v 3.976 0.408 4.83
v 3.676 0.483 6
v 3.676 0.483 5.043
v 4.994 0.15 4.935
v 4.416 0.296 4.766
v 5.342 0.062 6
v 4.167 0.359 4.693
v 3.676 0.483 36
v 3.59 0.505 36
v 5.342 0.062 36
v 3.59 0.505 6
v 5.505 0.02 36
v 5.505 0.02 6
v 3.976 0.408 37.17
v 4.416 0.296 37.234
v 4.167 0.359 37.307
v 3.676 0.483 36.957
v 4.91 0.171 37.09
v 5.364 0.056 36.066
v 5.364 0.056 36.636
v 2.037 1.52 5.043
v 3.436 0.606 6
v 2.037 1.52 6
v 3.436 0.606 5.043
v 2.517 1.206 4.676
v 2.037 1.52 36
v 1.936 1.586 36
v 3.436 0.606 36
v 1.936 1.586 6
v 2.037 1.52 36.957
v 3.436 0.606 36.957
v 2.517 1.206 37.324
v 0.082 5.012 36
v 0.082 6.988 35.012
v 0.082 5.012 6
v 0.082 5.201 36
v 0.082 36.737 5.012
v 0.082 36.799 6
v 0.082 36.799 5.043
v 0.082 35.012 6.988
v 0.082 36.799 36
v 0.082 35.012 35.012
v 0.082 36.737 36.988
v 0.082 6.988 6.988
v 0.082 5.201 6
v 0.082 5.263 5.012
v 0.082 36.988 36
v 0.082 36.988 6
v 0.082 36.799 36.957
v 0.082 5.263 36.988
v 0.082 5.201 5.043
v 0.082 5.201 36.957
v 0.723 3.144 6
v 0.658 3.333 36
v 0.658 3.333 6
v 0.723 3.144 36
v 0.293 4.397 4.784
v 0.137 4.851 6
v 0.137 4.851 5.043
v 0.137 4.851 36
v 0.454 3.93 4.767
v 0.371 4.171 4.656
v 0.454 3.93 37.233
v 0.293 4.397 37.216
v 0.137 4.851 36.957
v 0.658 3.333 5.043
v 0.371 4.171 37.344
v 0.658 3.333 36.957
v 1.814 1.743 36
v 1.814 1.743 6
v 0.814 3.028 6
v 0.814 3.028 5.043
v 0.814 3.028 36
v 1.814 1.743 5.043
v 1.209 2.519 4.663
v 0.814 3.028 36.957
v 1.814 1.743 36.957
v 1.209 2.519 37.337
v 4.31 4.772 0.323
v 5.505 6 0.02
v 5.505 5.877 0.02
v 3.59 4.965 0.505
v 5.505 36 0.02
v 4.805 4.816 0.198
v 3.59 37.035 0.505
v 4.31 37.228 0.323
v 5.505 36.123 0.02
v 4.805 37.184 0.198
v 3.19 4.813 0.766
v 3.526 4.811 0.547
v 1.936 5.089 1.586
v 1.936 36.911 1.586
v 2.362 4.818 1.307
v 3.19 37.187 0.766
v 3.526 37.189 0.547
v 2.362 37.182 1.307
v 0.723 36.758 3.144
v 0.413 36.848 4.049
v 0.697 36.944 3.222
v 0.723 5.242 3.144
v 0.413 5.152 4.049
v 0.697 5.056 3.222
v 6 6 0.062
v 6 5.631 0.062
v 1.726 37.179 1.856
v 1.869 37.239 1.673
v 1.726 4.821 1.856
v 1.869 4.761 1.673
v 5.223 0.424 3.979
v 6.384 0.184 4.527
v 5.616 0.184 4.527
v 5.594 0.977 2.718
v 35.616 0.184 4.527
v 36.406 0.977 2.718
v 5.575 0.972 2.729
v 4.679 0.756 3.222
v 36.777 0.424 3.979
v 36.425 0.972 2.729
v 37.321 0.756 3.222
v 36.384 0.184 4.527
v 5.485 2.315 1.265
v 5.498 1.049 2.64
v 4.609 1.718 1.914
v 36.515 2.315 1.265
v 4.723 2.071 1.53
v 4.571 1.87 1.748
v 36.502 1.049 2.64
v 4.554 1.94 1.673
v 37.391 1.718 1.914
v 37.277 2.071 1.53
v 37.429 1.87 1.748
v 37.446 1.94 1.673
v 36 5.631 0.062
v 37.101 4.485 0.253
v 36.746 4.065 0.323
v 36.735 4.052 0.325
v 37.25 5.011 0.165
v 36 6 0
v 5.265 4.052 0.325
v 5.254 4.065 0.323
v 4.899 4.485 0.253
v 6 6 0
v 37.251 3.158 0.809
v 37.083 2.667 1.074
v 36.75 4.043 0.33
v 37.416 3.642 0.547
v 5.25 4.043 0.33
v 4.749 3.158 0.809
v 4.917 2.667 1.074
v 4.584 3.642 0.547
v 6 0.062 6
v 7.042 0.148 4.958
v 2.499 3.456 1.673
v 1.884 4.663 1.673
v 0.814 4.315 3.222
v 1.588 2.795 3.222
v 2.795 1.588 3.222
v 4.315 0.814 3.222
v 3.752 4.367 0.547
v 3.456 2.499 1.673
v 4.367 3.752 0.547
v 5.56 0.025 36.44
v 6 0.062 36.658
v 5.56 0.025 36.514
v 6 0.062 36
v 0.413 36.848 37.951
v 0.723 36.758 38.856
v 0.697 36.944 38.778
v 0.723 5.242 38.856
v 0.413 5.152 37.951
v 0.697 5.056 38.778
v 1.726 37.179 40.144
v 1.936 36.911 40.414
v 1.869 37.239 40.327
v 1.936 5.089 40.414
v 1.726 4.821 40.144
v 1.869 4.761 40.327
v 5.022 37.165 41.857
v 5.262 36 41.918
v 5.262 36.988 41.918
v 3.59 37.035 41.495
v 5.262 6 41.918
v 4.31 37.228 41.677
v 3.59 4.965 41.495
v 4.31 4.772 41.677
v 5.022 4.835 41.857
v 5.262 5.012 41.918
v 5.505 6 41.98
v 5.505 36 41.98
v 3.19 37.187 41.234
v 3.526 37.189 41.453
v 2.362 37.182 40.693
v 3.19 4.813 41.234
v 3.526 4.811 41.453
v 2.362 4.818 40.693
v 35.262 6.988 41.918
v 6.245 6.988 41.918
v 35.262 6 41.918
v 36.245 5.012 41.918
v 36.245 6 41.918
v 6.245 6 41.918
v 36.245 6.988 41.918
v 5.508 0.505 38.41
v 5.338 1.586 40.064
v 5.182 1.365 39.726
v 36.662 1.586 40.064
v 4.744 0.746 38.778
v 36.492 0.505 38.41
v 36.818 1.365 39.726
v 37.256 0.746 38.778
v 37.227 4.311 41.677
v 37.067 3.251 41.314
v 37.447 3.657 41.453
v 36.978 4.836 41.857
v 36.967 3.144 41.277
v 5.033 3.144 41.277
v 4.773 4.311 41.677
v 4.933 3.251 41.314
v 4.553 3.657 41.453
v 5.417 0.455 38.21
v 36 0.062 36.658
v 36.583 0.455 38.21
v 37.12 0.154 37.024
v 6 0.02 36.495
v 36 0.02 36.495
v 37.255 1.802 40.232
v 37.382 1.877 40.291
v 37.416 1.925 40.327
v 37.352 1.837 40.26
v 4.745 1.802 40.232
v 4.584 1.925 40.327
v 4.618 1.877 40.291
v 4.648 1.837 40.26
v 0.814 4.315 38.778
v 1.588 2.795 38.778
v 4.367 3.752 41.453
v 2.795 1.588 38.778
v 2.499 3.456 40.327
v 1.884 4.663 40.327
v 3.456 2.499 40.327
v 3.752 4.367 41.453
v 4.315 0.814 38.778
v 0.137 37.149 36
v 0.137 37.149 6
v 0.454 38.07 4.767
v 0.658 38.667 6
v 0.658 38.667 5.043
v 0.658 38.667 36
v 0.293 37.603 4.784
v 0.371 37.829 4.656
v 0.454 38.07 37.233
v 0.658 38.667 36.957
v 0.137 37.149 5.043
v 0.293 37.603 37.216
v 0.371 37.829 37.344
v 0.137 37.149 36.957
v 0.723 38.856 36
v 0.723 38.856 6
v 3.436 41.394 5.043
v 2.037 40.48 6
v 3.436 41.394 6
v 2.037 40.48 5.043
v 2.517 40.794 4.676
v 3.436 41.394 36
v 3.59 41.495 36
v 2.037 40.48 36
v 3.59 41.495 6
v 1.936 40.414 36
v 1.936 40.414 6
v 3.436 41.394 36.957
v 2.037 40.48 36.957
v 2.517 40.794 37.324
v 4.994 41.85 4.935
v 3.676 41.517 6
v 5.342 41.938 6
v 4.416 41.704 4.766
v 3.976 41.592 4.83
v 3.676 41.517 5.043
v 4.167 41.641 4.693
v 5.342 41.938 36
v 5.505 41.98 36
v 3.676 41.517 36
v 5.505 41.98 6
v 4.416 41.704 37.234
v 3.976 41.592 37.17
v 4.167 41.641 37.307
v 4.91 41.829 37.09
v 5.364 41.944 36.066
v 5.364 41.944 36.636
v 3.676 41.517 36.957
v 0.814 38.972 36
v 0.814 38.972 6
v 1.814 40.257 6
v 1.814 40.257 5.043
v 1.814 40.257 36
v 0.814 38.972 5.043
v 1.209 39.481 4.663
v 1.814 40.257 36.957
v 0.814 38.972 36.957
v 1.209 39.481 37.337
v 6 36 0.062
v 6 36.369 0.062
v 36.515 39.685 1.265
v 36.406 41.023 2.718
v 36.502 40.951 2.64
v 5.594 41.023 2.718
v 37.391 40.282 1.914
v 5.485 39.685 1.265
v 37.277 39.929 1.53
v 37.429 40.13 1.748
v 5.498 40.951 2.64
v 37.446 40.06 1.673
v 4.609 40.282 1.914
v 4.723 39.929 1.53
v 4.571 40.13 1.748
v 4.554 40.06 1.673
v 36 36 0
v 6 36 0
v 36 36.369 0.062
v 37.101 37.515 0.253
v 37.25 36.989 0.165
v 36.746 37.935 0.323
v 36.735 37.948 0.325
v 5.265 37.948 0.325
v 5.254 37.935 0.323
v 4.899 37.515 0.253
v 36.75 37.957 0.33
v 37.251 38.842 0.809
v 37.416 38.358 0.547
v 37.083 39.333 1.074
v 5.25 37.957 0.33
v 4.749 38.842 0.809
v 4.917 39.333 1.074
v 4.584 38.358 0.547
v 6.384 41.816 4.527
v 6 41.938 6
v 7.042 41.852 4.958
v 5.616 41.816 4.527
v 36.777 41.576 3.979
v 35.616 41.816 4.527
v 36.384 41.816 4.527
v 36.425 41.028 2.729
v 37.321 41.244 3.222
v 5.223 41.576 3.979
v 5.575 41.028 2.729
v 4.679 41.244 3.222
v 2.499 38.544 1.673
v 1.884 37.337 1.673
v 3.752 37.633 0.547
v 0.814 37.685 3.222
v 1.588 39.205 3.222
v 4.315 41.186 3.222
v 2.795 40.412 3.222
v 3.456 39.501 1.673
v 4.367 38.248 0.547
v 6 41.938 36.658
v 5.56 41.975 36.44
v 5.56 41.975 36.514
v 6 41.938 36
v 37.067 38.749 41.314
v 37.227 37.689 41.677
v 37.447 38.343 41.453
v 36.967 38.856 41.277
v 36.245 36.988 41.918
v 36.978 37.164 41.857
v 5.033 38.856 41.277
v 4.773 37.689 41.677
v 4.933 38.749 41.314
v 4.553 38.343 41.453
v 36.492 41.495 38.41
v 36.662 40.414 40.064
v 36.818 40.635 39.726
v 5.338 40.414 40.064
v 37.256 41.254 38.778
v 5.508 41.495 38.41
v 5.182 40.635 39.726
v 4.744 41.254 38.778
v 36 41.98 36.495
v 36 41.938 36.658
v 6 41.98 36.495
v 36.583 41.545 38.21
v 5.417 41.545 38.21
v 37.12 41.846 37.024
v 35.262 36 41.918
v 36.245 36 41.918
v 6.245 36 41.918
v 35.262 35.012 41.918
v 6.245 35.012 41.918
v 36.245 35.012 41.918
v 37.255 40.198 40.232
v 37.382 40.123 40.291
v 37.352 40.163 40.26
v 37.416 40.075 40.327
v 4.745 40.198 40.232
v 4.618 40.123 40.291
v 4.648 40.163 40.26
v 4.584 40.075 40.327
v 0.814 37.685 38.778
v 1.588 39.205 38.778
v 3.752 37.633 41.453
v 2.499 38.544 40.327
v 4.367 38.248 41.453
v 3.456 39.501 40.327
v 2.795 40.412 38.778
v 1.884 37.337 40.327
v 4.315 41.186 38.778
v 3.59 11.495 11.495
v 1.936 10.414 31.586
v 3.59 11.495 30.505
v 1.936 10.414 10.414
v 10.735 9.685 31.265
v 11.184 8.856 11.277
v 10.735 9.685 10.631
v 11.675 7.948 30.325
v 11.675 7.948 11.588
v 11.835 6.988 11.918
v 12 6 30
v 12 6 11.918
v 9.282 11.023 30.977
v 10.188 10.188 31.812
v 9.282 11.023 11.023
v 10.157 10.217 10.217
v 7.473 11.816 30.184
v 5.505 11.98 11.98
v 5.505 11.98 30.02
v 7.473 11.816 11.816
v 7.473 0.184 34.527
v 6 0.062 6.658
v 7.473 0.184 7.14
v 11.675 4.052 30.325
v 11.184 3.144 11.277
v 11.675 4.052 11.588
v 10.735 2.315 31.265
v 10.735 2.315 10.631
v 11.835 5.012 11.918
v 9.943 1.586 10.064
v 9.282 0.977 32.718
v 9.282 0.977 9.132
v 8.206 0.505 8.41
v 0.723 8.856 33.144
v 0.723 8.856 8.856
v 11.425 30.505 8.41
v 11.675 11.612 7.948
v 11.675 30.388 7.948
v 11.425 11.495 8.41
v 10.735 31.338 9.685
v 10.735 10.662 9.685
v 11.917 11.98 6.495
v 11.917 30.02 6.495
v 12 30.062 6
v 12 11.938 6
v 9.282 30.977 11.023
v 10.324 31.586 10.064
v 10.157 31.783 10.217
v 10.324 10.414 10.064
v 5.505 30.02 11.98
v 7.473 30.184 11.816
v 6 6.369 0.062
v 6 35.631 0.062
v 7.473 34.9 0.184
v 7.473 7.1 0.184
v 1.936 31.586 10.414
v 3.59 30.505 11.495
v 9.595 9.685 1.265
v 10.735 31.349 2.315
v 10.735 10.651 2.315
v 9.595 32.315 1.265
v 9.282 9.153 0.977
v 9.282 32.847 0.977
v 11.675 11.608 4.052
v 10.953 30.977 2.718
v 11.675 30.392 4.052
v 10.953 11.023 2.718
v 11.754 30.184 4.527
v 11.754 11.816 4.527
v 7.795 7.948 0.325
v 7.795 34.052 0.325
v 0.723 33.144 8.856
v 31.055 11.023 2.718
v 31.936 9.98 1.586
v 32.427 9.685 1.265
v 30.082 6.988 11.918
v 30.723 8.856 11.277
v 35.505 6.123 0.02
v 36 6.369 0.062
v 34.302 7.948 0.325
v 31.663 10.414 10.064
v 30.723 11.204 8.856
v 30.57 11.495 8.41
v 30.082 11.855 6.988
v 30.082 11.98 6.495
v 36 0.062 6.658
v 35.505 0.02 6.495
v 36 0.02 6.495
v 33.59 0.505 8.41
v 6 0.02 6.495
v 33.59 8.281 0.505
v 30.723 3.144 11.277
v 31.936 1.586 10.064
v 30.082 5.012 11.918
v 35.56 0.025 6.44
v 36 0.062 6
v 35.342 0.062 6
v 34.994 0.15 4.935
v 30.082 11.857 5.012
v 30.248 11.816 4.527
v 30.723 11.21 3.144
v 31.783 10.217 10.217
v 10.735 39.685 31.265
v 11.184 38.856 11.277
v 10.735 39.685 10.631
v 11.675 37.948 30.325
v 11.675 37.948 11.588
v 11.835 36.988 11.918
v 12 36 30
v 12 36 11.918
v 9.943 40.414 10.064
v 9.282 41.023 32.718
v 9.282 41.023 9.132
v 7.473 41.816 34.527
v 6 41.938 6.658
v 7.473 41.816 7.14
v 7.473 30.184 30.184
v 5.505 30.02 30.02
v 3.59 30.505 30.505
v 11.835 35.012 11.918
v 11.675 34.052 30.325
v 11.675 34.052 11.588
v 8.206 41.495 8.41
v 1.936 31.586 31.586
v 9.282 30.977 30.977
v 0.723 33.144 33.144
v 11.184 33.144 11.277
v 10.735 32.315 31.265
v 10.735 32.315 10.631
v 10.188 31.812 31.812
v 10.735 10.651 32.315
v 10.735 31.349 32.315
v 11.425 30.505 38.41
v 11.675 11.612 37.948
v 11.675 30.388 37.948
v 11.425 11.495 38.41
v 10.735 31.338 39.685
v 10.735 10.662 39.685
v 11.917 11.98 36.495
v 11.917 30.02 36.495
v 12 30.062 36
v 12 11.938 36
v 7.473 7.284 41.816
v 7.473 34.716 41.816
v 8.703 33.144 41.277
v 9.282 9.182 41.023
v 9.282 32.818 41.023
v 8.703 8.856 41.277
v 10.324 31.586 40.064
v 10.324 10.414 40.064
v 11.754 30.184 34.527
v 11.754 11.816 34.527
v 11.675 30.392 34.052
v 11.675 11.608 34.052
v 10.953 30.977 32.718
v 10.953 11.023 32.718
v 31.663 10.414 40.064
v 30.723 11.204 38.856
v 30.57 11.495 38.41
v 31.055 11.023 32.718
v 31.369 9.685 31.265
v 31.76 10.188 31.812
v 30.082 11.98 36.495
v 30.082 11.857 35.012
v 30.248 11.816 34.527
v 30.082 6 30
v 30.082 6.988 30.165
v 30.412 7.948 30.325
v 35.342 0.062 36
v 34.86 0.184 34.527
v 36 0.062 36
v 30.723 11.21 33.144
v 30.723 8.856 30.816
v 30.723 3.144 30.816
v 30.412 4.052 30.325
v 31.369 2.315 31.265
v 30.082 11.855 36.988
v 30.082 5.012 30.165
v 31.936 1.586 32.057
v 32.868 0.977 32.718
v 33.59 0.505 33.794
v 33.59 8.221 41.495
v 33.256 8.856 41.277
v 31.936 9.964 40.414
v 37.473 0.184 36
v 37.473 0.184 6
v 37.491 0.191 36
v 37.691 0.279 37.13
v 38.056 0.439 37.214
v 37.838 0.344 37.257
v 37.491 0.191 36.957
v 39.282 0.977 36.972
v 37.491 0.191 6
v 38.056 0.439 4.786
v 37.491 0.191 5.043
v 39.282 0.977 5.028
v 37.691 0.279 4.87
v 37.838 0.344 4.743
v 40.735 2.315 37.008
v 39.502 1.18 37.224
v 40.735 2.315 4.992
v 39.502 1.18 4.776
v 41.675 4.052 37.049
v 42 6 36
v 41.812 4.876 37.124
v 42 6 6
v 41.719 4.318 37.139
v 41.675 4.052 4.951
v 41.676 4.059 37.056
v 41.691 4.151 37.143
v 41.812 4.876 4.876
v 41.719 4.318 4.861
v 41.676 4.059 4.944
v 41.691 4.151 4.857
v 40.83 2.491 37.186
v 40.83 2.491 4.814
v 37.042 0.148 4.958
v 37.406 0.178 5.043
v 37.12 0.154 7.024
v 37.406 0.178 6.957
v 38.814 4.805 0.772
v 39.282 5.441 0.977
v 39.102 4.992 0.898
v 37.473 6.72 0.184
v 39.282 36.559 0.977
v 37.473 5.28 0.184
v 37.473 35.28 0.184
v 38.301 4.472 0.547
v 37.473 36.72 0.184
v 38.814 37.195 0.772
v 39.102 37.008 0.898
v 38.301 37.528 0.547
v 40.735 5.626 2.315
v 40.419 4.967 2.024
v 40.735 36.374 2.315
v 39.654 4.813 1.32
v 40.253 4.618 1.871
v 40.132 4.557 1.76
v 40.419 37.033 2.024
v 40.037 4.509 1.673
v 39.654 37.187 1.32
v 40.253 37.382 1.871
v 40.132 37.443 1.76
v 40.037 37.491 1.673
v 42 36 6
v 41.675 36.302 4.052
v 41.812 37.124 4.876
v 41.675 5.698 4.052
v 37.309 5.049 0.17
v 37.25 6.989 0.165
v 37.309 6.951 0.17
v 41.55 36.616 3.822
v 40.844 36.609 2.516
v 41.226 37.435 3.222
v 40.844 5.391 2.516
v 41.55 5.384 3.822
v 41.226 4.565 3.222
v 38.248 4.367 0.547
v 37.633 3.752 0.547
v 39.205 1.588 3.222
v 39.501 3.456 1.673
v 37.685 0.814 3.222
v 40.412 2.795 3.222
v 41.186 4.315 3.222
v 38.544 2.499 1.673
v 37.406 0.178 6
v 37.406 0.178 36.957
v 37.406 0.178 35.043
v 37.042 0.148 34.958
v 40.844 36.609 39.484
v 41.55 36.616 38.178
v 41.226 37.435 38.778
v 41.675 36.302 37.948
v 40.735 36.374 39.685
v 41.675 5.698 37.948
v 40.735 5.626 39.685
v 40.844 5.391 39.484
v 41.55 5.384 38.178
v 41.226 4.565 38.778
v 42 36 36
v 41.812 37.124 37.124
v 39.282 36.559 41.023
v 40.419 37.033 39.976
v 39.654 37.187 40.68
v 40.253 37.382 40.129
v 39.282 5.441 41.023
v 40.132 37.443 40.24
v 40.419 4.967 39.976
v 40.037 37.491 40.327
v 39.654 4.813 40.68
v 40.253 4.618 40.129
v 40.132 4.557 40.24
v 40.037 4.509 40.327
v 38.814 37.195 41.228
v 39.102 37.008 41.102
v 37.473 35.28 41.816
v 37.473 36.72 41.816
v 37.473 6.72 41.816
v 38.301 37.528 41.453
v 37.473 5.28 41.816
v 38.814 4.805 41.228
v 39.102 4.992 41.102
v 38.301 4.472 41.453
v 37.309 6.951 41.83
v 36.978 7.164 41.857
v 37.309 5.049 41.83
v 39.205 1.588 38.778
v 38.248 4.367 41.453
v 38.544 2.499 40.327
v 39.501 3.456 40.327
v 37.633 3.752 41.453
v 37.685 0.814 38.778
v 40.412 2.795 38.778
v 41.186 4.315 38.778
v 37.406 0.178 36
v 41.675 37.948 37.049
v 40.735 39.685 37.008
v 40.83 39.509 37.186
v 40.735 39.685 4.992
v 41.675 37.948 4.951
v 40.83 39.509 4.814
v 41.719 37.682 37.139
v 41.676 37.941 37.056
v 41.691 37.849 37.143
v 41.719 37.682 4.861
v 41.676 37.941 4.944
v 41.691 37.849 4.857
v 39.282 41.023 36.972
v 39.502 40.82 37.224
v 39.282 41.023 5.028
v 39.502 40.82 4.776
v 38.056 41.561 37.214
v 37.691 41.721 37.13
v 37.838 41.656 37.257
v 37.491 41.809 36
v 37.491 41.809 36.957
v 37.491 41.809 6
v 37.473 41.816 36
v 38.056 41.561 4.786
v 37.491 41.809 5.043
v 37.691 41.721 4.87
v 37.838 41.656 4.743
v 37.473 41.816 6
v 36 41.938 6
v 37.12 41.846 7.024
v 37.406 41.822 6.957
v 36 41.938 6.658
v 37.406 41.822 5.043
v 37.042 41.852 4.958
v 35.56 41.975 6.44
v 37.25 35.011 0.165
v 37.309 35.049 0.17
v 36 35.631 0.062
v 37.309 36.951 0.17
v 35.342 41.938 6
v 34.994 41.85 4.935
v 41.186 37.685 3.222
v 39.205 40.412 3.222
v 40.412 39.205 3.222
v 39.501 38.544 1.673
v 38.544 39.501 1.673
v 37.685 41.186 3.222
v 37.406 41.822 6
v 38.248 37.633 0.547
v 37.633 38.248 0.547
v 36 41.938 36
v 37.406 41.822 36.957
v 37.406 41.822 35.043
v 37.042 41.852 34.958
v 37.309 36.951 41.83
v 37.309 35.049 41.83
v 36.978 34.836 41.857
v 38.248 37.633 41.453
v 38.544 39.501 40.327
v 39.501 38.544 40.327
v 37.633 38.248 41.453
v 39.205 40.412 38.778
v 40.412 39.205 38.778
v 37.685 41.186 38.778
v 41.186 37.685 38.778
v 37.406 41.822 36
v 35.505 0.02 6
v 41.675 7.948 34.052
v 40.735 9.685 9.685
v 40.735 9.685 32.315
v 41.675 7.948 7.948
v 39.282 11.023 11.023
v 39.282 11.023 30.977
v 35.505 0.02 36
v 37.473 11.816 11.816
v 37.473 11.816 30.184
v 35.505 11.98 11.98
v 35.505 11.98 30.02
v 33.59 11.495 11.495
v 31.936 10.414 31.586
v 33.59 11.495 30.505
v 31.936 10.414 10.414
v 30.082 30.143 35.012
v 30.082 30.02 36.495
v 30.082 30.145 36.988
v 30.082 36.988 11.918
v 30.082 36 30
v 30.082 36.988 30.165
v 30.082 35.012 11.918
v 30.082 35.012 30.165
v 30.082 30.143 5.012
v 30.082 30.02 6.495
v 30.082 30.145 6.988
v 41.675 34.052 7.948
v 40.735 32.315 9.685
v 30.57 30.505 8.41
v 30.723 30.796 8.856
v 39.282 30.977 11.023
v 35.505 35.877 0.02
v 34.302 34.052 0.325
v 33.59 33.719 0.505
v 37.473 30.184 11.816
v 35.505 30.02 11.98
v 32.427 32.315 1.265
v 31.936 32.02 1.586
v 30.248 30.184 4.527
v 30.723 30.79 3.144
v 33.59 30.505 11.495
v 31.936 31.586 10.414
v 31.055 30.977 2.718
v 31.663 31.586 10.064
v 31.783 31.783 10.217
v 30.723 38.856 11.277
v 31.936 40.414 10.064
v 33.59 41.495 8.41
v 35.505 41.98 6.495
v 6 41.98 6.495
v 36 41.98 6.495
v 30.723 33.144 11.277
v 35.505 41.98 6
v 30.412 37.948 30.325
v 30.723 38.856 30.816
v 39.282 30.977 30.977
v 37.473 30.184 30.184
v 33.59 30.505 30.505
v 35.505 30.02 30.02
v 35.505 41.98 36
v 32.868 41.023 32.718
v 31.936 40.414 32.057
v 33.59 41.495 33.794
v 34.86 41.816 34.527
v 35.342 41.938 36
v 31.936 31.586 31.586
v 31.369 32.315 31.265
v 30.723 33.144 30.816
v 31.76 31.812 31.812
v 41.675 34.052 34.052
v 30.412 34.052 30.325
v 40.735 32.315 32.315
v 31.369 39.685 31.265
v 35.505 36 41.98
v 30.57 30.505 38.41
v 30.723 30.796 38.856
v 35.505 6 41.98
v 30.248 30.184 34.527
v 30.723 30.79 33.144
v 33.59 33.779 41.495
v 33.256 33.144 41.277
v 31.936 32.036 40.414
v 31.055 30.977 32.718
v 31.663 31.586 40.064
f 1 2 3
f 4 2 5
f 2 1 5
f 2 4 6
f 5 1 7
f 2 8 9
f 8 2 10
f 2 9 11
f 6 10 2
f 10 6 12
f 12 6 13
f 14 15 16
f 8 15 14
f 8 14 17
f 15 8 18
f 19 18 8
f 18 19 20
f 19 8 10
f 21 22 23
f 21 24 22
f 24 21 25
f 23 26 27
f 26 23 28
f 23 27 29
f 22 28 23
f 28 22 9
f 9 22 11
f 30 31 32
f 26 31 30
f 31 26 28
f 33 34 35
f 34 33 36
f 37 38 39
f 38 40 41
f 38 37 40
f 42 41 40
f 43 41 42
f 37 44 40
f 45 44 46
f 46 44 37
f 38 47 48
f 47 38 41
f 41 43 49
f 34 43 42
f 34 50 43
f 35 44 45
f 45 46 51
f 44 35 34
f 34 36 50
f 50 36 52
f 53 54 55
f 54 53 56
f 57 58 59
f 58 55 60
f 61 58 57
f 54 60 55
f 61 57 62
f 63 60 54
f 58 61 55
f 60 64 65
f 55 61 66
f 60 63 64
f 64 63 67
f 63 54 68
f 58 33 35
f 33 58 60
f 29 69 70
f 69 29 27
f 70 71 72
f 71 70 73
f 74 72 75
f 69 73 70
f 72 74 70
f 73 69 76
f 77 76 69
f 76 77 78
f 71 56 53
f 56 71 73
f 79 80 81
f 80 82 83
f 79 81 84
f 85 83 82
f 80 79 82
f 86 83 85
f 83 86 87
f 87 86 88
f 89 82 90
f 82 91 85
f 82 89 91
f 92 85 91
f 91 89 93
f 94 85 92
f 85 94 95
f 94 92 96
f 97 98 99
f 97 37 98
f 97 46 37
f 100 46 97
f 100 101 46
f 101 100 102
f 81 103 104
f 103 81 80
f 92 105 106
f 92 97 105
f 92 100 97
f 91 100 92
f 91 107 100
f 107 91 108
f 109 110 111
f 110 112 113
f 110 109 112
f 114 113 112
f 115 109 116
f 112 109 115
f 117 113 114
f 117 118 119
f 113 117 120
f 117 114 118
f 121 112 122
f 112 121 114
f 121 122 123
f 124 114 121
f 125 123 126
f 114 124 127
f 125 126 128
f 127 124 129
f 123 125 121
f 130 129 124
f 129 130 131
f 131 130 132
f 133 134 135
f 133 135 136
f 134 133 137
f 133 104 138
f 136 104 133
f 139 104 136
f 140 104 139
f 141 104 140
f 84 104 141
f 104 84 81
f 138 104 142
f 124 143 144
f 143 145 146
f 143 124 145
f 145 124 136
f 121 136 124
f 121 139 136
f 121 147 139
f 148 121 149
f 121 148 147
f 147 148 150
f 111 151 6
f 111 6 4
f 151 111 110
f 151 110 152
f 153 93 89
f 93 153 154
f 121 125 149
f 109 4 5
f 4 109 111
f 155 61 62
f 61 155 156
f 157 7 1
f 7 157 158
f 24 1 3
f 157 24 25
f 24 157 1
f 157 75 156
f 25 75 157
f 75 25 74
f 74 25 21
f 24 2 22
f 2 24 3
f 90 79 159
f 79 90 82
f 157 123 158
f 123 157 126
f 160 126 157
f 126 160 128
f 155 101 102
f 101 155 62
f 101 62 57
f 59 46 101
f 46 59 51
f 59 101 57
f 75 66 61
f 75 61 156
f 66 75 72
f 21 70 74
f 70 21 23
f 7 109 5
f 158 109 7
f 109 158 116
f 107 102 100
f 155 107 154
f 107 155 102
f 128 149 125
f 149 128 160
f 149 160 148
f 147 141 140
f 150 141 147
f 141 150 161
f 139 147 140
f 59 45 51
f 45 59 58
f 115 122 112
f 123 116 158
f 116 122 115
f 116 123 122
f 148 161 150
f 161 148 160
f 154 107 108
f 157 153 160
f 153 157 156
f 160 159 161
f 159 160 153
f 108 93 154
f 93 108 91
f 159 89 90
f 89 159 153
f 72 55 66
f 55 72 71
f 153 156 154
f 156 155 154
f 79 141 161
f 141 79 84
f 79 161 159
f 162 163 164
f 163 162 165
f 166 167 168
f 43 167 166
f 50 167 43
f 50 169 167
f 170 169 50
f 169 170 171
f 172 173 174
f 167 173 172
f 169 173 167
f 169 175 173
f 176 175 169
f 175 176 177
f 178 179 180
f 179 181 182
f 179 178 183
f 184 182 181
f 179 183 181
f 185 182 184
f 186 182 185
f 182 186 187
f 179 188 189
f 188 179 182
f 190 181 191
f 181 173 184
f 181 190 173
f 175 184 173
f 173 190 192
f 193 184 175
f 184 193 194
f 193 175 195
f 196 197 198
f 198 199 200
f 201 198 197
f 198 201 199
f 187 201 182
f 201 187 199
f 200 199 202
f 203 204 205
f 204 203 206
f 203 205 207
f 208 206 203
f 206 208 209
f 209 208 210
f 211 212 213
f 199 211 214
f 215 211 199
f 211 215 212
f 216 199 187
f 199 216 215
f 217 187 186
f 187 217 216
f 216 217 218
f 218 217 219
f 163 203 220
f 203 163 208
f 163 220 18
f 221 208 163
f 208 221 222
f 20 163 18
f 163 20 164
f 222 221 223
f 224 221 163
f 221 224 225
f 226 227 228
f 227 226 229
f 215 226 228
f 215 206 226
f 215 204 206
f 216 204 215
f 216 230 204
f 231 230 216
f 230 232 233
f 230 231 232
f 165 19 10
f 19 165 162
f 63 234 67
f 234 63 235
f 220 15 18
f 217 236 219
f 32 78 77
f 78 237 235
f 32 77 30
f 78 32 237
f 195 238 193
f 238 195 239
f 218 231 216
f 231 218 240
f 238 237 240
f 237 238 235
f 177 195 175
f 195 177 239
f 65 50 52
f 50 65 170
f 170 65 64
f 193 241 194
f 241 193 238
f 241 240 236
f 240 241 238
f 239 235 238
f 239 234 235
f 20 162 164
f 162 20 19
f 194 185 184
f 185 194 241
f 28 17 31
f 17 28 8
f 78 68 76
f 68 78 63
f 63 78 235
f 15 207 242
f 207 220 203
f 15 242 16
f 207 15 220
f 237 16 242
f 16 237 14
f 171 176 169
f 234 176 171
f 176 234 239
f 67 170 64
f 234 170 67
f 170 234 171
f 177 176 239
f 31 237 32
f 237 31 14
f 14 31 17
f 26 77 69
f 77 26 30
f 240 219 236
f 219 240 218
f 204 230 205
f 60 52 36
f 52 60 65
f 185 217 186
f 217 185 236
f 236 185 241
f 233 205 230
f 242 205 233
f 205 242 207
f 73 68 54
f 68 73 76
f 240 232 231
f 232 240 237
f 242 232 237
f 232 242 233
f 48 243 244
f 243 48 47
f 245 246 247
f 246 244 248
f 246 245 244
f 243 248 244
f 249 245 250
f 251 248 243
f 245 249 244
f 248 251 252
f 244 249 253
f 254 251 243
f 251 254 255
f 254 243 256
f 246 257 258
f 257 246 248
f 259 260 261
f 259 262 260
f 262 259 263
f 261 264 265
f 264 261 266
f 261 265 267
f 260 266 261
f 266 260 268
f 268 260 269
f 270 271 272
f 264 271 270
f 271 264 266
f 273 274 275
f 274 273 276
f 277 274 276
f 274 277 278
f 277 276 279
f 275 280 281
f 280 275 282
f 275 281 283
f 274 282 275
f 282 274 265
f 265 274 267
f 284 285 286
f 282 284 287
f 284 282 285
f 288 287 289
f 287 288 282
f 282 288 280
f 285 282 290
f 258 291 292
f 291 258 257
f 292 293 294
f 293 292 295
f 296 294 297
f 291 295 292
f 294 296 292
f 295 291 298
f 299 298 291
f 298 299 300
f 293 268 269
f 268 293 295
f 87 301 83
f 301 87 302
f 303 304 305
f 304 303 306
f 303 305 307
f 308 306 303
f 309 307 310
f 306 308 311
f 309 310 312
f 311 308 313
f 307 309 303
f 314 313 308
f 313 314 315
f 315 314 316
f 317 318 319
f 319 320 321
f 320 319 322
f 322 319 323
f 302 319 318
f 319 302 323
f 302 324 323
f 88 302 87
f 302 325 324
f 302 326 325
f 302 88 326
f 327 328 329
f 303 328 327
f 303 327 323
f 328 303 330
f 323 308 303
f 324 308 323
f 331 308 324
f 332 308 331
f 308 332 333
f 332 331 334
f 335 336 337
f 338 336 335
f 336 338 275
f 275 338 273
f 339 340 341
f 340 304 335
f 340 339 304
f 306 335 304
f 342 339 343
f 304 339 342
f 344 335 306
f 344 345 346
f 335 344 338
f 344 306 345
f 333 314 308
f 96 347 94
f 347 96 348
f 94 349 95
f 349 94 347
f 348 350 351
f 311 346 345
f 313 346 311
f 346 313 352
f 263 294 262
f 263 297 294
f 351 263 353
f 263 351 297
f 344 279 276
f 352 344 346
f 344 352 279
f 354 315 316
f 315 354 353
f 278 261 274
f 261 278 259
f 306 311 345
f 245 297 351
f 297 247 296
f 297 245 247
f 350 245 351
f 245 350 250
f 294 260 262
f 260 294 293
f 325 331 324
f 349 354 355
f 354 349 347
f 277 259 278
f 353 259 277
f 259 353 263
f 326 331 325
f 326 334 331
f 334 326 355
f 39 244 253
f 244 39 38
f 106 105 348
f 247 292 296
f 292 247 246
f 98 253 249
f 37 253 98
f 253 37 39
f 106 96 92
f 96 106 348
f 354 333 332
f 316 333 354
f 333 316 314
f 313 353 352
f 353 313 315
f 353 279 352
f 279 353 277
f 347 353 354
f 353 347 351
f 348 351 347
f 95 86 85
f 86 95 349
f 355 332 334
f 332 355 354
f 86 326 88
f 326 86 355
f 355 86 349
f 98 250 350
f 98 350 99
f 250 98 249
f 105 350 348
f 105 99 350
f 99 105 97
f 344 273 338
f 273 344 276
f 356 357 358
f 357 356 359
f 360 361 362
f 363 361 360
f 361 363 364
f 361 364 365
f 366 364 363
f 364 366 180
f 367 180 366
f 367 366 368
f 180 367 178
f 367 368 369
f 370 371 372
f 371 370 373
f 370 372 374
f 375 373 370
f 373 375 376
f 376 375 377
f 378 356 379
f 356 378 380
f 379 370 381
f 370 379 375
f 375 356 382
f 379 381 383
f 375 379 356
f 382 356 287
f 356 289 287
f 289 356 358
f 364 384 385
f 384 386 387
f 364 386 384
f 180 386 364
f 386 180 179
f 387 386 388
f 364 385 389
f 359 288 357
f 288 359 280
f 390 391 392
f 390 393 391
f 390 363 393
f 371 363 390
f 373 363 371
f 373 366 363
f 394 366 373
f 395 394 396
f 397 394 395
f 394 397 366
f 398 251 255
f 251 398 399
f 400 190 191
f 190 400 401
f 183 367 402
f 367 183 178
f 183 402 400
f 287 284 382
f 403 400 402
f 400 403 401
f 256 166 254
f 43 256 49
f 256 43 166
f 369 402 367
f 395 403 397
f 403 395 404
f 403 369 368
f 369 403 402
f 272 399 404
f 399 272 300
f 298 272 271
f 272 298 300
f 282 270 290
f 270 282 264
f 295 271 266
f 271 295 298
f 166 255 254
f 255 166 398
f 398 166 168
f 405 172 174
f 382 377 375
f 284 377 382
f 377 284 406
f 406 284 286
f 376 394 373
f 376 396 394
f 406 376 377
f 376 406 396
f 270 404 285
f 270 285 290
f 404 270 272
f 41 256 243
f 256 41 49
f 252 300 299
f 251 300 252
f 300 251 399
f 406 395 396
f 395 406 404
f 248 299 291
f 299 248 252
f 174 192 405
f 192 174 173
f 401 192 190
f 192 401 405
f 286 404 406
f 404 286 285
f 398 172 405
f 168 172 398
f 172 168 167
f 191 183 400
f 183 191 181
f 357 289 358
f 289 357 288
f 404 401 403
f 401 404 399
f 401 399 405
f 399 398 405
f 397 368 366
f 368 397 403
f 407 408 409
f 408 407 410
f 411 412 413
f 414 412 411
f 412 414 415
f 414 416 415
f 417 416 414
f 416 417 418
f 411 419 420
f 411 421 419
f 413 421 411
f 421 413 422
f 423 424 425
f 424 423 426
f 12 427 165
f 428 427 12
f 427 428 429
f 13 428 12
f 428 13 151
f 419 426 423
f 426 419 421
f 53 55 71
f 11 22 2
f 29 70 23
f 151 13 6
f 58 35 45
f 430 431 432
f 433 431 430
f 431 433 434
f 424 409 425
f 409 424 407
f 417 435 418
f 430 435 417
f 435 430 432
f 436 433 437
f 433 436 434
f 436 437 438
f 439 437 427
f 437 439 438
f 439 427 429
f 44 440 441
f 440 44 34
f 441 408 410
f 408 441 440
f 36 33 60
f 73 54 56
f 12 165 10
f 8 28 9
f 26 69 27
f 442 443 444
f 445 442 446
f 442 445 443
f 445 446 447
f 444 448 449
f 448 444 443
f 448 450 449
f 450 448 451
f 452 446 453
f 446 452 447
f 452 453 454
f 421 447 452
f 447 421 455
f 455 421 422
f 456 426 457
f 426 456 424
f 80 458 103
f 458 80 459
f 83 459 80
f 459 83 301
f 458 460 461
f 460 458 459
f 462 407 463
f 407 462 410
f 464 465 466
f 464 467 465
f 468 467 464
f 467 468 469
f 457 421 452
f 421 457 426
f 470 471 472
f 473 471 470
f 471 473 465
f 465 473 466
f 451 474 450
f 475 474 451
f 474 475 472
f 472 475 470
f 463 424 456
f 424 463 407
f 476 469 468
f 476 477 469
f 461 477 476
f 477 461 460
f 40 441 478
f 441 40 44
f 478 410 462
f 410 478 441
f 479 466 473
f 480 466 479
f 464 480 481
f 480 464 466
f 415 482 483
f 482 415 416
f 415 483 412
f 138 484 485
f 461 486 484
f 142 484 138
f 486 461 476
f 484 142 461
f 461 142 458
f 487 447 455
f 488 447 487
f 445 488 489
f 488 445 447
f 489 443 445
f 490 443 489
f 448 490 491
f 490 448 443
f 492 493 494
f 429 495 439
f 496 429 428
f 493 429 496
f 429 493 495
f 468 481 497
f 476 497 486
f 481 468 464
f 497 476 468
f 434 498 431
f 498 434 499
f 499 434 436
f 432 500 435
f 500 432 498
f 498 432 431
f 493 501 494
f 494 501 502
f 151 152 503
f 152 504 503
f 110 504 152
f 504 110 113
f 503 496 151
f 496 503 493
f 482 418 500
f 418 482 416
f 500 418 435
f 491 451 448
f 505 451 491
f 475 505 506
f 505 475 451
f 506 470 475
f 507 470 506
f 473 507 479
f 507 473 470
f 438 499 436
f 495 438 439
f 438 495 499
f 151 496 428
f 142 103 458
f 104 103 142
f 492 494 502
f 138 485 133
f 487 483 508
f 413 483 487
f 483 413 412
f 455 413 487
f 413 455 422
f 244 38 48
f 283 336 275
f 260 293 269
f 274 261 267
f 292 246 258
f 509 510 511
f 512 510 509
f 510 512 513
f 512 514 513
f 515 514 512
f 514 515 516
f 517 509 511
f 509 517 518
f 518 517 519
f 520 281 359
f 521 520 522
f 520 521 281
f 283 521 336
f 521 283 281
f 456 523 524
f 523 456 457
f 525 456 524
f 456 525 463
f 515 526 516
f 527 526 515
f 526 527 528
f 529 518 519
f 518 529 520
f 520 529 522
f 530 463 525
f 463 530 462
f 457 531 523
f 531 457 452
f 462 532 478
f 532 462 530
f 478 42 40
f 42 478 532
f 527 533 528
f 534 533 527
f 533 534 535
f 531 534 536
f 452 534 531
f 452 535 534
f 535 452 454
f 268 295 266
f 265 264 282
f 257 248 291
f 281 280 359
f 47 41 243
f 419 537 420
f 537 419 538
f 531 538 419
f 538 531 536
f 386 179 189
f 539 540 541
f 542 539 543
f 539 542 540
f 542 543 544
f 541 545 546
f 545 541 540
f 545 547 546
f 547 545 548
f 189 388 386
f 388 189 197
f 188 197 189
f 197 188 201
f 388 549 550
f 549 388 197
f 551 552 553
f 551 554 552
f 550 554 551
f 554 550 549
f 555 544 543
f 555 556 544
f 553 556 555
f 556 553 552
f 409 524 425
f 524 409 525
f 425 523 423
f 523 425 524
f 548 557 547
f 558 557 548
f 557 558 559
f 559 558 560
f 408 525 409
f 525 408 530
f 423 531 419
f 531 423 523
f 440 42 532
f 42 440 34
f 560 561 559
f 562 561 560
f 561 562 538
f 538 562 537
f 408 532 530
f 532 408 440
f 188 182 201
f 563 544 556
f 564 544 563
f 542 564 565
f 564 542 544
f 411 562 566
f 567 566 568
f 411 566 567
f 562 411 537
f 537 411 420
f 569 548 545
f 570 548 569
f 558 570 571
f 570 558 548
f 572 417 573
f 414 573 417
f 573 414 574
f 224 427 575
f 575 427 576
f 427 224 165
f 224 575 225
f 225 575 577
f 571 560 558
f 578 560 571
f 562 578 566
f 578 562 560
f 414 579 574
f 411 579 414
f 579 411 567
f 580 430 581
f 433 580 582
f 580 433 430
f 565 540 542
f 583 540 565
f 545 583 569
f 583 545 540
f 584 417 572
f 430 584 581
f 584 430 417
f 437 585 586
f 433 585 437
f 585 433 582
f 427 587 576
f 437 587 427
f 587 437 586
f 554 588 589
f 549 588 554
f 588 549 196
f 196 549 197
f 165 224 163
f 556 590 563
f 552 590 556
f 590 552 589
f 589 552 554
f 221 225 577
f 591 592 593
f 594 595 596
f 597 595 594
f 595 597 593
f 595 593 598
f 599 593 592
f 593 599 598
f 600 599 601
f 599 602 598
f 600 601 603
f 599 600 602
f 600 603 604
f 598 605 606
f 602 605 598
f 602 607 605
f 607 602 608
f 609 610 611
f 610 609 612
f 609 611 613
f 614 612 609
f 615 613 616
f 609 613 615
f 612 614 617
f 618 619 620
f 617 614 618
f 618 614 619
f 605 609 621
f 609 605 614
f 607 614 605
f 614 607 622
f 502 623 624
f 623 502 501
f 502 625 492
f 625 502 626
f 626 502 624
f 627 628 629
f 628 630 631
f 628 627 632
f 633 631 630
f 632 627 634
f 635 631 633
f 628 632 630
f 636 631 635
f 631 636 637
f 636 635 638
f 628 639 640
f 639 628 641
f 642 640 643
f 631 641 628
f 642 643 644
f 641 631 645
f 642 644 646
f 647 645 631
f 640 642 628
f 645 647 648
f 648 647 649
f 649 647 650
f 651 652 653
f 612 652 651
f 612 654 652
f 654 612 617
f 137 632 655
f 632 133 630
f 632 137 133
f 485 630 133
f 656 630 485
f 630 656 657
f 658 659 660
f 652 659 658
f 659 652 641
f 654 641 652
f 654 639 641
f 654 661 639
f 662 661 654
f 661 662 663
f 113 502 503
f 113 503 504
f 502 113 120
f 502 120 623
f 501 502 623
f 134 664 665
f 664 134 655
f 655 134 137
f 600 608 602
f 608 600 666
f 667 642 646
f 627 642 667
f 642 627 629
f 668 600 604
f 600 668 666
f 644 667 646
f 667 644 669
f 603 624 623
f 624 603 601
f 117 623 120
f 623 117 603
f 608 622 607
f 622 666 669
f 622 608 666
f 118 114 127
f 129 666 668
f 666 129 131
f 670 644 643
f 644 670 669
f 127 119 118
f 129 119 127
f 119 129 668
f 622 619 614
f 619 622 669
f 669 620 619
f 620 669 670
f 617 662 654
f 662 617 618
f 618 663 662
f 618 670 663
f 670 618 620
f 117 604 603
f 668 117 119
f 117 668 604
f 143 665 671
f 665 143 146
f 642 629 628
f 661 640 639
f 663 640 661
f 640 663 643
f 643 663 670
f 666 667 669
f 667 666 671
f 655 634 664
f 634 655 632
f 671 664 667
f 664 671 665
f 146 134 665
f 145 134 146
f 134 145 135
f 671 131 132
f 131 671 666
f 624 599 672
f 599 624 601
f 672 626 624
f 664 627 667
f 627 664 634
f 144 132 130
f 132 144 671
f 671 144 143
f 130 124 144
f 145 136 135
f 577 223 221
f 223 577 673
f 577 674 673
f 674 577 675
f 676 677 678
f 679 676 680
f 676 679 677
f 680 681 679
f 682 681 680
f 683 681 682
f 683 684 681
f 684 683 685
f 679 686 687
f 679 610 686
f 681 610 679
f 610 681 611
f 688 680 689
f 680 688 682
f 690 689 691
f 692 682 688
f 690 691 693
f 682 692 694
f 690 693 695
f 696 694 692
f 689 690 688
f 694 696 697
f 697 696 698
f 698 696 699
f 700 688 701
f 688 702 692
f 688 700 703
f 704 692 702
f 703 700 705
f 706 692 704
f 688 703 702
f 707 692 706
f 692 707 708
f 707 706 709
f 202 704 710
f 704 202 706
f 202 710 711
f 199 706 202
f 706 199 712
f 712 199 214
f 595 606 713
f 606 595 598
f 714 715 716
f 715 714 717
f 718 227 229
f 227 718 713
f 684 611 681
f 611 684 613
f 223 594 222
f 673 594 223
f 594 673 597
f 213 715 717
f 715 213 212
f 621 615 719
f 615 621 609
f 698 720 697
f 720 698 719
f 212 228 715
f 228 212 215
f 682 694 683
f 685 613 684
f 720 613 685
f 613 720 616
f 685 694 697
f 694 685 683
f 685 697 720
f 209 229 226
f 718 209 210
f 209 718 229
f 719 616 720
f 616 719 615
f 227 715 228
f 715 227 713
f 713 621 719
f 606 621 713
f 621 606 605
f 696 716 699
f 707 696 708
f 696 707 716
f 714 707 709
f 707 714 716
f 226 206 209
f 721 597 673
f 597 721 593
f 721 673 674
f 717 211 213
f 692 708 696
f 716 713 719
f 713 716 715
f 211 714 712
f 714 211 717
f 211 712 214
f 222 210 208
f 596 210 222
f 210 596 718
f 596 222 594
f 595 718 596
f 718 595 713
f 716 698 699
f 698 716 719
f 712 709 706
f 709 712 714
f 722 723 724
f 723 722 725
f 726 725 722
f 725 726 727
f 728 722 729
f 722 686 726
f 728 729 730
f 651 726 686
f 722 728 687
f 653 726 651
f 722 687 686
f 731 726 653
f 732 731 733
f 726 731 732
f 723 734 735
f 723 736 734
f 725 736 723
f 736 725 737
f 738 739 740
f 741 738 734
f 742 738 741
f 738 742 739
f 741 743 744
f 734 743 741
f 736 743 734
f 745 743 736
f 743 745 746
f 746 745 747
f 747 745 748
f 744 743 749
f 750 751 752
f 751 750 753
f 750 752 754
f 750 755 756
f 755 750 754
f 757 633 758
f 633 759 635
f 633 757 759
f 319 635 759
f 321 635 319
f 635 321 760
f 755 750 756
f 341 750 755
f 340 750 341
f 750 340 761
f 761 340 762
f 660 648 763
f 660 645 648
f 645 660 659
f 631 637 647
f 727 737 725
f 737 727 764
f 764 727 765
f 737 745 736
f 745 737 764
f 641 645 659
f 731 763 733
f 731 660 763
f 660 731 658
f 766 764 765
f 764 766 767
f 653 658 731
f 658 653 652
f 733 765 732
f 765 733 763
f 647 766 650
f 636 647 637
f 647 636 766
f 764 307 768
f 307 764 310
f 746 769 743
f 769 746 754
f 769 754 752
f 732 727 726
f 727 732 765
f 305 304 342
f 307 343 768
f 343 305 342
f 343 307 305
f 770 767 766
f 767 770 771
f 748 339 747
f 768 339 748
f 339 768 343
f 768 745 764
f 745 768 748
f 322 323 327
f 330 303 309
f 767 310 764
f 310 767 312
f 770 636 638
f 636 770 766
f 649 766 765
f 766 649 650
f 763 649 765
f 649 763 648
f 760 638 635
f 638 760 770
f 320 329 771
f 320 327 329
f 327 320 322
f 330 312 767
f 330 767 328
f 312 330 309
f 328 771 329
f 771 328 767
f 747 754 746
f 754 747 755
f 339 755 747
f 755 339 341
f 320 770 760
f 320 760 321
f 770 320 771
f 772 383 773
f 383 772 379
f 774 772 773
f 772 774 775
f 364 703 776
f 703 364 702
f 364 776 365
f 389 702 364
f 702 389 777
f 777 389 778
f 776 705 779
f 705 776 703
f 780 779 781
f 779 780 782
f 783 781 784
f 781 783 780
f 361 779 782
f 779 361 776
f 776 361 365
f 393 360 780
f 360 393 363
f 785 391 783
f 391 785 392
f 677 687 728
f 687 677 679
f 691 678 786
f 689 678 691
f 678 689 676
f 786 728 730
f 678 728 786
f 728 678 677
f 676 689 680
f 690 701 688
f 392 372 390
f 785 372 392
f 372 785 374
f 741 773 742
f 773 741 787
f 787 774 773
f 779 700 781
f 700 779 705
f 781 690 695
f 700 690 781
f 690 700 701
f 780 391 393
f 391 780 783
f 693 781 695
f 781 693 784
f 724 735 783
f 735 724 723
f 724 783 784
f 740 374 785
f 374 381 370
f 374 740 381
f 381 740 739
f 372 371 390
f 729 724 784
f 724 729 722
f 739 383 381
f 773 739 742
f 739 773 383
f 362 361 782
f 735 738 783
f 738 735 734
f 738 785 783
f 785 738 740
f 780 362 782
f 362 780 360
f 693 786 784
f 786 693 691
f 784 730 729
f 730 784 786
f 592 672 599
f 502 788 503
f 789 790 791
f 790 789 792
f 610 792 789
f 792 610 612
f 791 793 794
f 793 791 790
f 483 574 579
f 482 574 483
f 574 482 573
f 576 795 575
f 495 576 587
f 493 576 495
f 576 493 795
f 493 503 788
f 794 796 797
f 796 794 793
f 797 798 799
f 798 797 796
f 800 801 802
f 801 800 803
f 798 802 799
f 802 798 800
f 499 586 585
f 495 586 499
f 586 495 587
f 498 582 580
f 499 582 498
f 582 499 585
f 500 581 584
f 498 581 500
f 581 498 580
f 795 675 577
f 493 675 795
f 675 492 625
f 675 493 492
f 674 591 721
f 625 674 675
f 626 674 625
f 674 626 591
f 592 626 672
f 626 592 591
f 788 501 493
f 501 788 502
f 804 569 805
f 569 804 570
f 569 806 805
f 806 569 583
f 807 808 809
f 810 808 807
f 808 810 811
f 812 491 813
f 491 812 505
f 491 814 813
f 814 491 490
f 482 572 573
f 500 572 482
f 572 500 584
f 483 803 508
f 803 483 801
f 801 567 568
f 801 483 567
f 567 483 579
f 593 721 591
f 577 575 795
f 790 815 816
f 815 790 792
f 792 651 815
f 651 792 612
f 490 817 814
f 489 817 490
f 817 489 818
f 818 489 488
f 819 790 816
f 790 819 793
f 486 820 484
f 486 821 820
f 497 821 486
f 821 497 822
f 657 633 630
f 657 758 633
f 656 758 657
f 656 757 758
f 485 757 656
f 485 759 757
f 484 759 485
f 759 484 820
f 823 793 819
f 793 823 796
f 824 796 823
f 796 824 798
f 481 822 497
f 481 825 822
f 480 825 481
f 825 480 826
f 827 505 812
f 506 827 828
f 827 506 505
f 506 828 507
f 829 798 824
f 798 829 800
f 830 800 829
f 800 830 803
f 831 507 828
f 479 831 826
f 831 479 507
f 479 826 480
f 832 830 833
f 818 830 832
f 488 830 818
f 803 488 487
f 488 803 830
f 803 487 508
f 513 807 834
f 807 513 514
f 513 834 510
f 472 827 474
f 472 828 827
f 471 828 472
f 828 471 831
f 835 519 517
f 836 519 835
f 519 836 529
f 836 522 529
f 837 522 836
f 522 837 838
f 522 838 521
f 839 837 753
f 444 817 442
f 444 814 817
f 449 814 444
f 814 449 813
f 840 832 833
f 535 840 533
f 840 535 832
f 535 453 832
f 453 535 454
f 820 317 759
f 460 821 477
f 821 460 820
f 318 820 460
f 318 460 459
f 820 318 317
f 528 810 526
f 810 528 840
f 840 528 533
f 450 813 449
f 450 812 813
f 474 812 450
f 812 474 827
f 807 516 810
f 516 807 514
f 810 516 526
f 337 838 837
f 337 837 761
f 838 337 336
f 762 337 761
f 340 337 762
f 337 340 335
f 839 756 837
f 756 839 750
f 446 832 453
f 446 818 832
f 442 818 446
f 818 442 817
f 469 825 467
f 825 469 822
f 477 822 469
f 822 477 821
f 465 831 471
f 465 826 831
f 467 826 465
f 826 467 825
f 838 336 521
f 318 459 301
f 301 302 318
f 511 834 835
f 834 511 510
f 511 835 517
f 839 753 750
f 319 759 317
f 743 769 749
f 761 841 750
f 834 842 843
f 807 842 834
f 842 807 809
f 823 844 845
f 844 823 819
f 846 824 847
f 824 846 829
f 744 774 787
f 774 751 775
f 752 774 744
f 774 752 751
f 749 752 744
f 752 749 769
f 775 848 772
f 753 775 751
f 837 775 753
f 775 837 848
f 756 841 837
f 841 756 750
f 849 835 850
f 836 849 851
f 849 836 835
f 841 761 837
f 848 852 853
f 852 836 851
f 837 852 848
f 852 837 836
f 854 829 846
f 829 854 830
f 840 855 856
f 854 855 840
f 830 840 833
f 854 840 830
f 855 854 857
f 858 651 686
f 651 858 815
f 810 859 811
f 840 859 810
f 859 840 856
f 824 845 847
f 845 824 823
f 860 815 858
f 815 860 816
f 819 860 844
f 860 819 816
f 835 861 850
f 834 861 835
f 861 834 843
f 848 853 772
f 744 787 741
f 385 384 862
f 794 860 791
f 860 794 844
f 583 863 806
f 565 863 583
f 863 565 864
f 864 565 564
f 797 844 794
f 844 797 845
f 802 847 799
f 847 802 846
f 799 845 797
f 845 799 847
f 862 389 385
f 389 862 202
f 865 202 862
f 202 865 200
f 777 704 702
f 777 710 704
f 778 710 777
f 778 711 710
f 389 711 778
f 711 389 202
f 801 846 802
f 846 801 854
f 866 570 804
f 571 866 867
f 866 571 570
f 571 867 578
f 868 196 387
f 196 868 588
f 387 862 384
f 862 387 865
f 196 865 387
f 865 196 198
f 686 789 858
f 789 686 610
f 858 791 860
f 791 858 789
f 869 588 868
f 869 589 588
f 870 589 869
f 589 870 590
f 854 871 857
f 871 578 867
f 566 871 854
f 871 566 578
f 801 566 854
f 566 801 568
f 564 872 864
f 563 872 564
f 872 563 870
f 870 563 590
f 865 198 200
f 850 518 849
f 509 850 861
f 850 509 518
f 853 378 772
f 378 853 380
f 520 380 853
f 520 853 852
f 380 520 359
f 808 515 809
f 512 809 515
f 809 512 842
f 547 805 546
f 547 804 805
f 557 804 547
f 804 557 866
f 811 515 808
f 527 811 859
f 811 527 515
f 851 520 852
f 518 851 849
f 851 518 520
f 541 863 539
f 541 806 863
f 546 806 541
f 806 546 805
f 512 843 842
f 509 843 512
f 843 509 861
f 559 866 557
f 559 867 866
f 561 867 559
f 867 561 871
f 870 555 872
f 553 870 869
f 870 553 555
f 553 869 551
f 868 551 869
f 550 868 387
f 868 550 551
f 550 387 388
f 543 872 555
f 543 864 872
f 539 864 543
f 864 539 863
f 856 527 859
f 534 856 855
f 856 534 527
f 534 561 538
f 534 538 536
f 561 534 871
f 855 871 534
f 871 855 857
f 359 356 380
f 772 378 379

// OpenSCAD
module cubishThing( size=[20,20,20], radius=5, center=true, tip=true ) {
    
    // Get adapted sizes
    x=size[0]/2; // X offset
    y=size[1]/2; // Y offset
    z=size[2]/2; // Z offset

    
    if( center ) {
        // sides
        for(i=[-1,1]) {
            for(j=[-1,1]) {
                // z axis
                translate( [ size[0]/2*i, size[1]/2*j, 0-size[2]/2 ] )
                cylinder(r=radius,h=size[2]);
                
                // y axis
                translate( [ size[0]/2*i, size[1]/2, size[2]/2*j ] )
                rotate([90,0,0])
                cylinder(r=radius,h=size[1]);

                // x axis
                translate( [ 0-size[0]/2, size[1]/2*i, size[2]/2*j ] )
                rotate([0,90,0])
                cylinder(r=radius,h=size[0]);

                // rounded corners
                for(k=[-1,1]) {

                    translate( [ size[0]/2*i, size[1]/2*j, size[2]/2*k ] )
                    intersection() {
                        rotate([0,0,0])
                        cylinder(r=radius,h=radius*2,center=true);
                        
                        rotate([90,0,0])
                        cylinder(r=radius,h=radius*2,center=true);
                        
                        rotate([0,90,0])
                        cylinder(r=radius,h=radius*2,center=true);
                        
                        // remove tip
                        if( tip ) {
                            sphere(r=radius*1.02);
                        }
                    }
                }
            }
            
        }
    }
    
    if( !center ) {
        translate([ x+radius, y+radius, z+radius ])
        cubishThing( size=size, radius=radius, center=true, tip=tip );
    }
}

cubishThing( size=[30,30,30], radius=6, center=false );
